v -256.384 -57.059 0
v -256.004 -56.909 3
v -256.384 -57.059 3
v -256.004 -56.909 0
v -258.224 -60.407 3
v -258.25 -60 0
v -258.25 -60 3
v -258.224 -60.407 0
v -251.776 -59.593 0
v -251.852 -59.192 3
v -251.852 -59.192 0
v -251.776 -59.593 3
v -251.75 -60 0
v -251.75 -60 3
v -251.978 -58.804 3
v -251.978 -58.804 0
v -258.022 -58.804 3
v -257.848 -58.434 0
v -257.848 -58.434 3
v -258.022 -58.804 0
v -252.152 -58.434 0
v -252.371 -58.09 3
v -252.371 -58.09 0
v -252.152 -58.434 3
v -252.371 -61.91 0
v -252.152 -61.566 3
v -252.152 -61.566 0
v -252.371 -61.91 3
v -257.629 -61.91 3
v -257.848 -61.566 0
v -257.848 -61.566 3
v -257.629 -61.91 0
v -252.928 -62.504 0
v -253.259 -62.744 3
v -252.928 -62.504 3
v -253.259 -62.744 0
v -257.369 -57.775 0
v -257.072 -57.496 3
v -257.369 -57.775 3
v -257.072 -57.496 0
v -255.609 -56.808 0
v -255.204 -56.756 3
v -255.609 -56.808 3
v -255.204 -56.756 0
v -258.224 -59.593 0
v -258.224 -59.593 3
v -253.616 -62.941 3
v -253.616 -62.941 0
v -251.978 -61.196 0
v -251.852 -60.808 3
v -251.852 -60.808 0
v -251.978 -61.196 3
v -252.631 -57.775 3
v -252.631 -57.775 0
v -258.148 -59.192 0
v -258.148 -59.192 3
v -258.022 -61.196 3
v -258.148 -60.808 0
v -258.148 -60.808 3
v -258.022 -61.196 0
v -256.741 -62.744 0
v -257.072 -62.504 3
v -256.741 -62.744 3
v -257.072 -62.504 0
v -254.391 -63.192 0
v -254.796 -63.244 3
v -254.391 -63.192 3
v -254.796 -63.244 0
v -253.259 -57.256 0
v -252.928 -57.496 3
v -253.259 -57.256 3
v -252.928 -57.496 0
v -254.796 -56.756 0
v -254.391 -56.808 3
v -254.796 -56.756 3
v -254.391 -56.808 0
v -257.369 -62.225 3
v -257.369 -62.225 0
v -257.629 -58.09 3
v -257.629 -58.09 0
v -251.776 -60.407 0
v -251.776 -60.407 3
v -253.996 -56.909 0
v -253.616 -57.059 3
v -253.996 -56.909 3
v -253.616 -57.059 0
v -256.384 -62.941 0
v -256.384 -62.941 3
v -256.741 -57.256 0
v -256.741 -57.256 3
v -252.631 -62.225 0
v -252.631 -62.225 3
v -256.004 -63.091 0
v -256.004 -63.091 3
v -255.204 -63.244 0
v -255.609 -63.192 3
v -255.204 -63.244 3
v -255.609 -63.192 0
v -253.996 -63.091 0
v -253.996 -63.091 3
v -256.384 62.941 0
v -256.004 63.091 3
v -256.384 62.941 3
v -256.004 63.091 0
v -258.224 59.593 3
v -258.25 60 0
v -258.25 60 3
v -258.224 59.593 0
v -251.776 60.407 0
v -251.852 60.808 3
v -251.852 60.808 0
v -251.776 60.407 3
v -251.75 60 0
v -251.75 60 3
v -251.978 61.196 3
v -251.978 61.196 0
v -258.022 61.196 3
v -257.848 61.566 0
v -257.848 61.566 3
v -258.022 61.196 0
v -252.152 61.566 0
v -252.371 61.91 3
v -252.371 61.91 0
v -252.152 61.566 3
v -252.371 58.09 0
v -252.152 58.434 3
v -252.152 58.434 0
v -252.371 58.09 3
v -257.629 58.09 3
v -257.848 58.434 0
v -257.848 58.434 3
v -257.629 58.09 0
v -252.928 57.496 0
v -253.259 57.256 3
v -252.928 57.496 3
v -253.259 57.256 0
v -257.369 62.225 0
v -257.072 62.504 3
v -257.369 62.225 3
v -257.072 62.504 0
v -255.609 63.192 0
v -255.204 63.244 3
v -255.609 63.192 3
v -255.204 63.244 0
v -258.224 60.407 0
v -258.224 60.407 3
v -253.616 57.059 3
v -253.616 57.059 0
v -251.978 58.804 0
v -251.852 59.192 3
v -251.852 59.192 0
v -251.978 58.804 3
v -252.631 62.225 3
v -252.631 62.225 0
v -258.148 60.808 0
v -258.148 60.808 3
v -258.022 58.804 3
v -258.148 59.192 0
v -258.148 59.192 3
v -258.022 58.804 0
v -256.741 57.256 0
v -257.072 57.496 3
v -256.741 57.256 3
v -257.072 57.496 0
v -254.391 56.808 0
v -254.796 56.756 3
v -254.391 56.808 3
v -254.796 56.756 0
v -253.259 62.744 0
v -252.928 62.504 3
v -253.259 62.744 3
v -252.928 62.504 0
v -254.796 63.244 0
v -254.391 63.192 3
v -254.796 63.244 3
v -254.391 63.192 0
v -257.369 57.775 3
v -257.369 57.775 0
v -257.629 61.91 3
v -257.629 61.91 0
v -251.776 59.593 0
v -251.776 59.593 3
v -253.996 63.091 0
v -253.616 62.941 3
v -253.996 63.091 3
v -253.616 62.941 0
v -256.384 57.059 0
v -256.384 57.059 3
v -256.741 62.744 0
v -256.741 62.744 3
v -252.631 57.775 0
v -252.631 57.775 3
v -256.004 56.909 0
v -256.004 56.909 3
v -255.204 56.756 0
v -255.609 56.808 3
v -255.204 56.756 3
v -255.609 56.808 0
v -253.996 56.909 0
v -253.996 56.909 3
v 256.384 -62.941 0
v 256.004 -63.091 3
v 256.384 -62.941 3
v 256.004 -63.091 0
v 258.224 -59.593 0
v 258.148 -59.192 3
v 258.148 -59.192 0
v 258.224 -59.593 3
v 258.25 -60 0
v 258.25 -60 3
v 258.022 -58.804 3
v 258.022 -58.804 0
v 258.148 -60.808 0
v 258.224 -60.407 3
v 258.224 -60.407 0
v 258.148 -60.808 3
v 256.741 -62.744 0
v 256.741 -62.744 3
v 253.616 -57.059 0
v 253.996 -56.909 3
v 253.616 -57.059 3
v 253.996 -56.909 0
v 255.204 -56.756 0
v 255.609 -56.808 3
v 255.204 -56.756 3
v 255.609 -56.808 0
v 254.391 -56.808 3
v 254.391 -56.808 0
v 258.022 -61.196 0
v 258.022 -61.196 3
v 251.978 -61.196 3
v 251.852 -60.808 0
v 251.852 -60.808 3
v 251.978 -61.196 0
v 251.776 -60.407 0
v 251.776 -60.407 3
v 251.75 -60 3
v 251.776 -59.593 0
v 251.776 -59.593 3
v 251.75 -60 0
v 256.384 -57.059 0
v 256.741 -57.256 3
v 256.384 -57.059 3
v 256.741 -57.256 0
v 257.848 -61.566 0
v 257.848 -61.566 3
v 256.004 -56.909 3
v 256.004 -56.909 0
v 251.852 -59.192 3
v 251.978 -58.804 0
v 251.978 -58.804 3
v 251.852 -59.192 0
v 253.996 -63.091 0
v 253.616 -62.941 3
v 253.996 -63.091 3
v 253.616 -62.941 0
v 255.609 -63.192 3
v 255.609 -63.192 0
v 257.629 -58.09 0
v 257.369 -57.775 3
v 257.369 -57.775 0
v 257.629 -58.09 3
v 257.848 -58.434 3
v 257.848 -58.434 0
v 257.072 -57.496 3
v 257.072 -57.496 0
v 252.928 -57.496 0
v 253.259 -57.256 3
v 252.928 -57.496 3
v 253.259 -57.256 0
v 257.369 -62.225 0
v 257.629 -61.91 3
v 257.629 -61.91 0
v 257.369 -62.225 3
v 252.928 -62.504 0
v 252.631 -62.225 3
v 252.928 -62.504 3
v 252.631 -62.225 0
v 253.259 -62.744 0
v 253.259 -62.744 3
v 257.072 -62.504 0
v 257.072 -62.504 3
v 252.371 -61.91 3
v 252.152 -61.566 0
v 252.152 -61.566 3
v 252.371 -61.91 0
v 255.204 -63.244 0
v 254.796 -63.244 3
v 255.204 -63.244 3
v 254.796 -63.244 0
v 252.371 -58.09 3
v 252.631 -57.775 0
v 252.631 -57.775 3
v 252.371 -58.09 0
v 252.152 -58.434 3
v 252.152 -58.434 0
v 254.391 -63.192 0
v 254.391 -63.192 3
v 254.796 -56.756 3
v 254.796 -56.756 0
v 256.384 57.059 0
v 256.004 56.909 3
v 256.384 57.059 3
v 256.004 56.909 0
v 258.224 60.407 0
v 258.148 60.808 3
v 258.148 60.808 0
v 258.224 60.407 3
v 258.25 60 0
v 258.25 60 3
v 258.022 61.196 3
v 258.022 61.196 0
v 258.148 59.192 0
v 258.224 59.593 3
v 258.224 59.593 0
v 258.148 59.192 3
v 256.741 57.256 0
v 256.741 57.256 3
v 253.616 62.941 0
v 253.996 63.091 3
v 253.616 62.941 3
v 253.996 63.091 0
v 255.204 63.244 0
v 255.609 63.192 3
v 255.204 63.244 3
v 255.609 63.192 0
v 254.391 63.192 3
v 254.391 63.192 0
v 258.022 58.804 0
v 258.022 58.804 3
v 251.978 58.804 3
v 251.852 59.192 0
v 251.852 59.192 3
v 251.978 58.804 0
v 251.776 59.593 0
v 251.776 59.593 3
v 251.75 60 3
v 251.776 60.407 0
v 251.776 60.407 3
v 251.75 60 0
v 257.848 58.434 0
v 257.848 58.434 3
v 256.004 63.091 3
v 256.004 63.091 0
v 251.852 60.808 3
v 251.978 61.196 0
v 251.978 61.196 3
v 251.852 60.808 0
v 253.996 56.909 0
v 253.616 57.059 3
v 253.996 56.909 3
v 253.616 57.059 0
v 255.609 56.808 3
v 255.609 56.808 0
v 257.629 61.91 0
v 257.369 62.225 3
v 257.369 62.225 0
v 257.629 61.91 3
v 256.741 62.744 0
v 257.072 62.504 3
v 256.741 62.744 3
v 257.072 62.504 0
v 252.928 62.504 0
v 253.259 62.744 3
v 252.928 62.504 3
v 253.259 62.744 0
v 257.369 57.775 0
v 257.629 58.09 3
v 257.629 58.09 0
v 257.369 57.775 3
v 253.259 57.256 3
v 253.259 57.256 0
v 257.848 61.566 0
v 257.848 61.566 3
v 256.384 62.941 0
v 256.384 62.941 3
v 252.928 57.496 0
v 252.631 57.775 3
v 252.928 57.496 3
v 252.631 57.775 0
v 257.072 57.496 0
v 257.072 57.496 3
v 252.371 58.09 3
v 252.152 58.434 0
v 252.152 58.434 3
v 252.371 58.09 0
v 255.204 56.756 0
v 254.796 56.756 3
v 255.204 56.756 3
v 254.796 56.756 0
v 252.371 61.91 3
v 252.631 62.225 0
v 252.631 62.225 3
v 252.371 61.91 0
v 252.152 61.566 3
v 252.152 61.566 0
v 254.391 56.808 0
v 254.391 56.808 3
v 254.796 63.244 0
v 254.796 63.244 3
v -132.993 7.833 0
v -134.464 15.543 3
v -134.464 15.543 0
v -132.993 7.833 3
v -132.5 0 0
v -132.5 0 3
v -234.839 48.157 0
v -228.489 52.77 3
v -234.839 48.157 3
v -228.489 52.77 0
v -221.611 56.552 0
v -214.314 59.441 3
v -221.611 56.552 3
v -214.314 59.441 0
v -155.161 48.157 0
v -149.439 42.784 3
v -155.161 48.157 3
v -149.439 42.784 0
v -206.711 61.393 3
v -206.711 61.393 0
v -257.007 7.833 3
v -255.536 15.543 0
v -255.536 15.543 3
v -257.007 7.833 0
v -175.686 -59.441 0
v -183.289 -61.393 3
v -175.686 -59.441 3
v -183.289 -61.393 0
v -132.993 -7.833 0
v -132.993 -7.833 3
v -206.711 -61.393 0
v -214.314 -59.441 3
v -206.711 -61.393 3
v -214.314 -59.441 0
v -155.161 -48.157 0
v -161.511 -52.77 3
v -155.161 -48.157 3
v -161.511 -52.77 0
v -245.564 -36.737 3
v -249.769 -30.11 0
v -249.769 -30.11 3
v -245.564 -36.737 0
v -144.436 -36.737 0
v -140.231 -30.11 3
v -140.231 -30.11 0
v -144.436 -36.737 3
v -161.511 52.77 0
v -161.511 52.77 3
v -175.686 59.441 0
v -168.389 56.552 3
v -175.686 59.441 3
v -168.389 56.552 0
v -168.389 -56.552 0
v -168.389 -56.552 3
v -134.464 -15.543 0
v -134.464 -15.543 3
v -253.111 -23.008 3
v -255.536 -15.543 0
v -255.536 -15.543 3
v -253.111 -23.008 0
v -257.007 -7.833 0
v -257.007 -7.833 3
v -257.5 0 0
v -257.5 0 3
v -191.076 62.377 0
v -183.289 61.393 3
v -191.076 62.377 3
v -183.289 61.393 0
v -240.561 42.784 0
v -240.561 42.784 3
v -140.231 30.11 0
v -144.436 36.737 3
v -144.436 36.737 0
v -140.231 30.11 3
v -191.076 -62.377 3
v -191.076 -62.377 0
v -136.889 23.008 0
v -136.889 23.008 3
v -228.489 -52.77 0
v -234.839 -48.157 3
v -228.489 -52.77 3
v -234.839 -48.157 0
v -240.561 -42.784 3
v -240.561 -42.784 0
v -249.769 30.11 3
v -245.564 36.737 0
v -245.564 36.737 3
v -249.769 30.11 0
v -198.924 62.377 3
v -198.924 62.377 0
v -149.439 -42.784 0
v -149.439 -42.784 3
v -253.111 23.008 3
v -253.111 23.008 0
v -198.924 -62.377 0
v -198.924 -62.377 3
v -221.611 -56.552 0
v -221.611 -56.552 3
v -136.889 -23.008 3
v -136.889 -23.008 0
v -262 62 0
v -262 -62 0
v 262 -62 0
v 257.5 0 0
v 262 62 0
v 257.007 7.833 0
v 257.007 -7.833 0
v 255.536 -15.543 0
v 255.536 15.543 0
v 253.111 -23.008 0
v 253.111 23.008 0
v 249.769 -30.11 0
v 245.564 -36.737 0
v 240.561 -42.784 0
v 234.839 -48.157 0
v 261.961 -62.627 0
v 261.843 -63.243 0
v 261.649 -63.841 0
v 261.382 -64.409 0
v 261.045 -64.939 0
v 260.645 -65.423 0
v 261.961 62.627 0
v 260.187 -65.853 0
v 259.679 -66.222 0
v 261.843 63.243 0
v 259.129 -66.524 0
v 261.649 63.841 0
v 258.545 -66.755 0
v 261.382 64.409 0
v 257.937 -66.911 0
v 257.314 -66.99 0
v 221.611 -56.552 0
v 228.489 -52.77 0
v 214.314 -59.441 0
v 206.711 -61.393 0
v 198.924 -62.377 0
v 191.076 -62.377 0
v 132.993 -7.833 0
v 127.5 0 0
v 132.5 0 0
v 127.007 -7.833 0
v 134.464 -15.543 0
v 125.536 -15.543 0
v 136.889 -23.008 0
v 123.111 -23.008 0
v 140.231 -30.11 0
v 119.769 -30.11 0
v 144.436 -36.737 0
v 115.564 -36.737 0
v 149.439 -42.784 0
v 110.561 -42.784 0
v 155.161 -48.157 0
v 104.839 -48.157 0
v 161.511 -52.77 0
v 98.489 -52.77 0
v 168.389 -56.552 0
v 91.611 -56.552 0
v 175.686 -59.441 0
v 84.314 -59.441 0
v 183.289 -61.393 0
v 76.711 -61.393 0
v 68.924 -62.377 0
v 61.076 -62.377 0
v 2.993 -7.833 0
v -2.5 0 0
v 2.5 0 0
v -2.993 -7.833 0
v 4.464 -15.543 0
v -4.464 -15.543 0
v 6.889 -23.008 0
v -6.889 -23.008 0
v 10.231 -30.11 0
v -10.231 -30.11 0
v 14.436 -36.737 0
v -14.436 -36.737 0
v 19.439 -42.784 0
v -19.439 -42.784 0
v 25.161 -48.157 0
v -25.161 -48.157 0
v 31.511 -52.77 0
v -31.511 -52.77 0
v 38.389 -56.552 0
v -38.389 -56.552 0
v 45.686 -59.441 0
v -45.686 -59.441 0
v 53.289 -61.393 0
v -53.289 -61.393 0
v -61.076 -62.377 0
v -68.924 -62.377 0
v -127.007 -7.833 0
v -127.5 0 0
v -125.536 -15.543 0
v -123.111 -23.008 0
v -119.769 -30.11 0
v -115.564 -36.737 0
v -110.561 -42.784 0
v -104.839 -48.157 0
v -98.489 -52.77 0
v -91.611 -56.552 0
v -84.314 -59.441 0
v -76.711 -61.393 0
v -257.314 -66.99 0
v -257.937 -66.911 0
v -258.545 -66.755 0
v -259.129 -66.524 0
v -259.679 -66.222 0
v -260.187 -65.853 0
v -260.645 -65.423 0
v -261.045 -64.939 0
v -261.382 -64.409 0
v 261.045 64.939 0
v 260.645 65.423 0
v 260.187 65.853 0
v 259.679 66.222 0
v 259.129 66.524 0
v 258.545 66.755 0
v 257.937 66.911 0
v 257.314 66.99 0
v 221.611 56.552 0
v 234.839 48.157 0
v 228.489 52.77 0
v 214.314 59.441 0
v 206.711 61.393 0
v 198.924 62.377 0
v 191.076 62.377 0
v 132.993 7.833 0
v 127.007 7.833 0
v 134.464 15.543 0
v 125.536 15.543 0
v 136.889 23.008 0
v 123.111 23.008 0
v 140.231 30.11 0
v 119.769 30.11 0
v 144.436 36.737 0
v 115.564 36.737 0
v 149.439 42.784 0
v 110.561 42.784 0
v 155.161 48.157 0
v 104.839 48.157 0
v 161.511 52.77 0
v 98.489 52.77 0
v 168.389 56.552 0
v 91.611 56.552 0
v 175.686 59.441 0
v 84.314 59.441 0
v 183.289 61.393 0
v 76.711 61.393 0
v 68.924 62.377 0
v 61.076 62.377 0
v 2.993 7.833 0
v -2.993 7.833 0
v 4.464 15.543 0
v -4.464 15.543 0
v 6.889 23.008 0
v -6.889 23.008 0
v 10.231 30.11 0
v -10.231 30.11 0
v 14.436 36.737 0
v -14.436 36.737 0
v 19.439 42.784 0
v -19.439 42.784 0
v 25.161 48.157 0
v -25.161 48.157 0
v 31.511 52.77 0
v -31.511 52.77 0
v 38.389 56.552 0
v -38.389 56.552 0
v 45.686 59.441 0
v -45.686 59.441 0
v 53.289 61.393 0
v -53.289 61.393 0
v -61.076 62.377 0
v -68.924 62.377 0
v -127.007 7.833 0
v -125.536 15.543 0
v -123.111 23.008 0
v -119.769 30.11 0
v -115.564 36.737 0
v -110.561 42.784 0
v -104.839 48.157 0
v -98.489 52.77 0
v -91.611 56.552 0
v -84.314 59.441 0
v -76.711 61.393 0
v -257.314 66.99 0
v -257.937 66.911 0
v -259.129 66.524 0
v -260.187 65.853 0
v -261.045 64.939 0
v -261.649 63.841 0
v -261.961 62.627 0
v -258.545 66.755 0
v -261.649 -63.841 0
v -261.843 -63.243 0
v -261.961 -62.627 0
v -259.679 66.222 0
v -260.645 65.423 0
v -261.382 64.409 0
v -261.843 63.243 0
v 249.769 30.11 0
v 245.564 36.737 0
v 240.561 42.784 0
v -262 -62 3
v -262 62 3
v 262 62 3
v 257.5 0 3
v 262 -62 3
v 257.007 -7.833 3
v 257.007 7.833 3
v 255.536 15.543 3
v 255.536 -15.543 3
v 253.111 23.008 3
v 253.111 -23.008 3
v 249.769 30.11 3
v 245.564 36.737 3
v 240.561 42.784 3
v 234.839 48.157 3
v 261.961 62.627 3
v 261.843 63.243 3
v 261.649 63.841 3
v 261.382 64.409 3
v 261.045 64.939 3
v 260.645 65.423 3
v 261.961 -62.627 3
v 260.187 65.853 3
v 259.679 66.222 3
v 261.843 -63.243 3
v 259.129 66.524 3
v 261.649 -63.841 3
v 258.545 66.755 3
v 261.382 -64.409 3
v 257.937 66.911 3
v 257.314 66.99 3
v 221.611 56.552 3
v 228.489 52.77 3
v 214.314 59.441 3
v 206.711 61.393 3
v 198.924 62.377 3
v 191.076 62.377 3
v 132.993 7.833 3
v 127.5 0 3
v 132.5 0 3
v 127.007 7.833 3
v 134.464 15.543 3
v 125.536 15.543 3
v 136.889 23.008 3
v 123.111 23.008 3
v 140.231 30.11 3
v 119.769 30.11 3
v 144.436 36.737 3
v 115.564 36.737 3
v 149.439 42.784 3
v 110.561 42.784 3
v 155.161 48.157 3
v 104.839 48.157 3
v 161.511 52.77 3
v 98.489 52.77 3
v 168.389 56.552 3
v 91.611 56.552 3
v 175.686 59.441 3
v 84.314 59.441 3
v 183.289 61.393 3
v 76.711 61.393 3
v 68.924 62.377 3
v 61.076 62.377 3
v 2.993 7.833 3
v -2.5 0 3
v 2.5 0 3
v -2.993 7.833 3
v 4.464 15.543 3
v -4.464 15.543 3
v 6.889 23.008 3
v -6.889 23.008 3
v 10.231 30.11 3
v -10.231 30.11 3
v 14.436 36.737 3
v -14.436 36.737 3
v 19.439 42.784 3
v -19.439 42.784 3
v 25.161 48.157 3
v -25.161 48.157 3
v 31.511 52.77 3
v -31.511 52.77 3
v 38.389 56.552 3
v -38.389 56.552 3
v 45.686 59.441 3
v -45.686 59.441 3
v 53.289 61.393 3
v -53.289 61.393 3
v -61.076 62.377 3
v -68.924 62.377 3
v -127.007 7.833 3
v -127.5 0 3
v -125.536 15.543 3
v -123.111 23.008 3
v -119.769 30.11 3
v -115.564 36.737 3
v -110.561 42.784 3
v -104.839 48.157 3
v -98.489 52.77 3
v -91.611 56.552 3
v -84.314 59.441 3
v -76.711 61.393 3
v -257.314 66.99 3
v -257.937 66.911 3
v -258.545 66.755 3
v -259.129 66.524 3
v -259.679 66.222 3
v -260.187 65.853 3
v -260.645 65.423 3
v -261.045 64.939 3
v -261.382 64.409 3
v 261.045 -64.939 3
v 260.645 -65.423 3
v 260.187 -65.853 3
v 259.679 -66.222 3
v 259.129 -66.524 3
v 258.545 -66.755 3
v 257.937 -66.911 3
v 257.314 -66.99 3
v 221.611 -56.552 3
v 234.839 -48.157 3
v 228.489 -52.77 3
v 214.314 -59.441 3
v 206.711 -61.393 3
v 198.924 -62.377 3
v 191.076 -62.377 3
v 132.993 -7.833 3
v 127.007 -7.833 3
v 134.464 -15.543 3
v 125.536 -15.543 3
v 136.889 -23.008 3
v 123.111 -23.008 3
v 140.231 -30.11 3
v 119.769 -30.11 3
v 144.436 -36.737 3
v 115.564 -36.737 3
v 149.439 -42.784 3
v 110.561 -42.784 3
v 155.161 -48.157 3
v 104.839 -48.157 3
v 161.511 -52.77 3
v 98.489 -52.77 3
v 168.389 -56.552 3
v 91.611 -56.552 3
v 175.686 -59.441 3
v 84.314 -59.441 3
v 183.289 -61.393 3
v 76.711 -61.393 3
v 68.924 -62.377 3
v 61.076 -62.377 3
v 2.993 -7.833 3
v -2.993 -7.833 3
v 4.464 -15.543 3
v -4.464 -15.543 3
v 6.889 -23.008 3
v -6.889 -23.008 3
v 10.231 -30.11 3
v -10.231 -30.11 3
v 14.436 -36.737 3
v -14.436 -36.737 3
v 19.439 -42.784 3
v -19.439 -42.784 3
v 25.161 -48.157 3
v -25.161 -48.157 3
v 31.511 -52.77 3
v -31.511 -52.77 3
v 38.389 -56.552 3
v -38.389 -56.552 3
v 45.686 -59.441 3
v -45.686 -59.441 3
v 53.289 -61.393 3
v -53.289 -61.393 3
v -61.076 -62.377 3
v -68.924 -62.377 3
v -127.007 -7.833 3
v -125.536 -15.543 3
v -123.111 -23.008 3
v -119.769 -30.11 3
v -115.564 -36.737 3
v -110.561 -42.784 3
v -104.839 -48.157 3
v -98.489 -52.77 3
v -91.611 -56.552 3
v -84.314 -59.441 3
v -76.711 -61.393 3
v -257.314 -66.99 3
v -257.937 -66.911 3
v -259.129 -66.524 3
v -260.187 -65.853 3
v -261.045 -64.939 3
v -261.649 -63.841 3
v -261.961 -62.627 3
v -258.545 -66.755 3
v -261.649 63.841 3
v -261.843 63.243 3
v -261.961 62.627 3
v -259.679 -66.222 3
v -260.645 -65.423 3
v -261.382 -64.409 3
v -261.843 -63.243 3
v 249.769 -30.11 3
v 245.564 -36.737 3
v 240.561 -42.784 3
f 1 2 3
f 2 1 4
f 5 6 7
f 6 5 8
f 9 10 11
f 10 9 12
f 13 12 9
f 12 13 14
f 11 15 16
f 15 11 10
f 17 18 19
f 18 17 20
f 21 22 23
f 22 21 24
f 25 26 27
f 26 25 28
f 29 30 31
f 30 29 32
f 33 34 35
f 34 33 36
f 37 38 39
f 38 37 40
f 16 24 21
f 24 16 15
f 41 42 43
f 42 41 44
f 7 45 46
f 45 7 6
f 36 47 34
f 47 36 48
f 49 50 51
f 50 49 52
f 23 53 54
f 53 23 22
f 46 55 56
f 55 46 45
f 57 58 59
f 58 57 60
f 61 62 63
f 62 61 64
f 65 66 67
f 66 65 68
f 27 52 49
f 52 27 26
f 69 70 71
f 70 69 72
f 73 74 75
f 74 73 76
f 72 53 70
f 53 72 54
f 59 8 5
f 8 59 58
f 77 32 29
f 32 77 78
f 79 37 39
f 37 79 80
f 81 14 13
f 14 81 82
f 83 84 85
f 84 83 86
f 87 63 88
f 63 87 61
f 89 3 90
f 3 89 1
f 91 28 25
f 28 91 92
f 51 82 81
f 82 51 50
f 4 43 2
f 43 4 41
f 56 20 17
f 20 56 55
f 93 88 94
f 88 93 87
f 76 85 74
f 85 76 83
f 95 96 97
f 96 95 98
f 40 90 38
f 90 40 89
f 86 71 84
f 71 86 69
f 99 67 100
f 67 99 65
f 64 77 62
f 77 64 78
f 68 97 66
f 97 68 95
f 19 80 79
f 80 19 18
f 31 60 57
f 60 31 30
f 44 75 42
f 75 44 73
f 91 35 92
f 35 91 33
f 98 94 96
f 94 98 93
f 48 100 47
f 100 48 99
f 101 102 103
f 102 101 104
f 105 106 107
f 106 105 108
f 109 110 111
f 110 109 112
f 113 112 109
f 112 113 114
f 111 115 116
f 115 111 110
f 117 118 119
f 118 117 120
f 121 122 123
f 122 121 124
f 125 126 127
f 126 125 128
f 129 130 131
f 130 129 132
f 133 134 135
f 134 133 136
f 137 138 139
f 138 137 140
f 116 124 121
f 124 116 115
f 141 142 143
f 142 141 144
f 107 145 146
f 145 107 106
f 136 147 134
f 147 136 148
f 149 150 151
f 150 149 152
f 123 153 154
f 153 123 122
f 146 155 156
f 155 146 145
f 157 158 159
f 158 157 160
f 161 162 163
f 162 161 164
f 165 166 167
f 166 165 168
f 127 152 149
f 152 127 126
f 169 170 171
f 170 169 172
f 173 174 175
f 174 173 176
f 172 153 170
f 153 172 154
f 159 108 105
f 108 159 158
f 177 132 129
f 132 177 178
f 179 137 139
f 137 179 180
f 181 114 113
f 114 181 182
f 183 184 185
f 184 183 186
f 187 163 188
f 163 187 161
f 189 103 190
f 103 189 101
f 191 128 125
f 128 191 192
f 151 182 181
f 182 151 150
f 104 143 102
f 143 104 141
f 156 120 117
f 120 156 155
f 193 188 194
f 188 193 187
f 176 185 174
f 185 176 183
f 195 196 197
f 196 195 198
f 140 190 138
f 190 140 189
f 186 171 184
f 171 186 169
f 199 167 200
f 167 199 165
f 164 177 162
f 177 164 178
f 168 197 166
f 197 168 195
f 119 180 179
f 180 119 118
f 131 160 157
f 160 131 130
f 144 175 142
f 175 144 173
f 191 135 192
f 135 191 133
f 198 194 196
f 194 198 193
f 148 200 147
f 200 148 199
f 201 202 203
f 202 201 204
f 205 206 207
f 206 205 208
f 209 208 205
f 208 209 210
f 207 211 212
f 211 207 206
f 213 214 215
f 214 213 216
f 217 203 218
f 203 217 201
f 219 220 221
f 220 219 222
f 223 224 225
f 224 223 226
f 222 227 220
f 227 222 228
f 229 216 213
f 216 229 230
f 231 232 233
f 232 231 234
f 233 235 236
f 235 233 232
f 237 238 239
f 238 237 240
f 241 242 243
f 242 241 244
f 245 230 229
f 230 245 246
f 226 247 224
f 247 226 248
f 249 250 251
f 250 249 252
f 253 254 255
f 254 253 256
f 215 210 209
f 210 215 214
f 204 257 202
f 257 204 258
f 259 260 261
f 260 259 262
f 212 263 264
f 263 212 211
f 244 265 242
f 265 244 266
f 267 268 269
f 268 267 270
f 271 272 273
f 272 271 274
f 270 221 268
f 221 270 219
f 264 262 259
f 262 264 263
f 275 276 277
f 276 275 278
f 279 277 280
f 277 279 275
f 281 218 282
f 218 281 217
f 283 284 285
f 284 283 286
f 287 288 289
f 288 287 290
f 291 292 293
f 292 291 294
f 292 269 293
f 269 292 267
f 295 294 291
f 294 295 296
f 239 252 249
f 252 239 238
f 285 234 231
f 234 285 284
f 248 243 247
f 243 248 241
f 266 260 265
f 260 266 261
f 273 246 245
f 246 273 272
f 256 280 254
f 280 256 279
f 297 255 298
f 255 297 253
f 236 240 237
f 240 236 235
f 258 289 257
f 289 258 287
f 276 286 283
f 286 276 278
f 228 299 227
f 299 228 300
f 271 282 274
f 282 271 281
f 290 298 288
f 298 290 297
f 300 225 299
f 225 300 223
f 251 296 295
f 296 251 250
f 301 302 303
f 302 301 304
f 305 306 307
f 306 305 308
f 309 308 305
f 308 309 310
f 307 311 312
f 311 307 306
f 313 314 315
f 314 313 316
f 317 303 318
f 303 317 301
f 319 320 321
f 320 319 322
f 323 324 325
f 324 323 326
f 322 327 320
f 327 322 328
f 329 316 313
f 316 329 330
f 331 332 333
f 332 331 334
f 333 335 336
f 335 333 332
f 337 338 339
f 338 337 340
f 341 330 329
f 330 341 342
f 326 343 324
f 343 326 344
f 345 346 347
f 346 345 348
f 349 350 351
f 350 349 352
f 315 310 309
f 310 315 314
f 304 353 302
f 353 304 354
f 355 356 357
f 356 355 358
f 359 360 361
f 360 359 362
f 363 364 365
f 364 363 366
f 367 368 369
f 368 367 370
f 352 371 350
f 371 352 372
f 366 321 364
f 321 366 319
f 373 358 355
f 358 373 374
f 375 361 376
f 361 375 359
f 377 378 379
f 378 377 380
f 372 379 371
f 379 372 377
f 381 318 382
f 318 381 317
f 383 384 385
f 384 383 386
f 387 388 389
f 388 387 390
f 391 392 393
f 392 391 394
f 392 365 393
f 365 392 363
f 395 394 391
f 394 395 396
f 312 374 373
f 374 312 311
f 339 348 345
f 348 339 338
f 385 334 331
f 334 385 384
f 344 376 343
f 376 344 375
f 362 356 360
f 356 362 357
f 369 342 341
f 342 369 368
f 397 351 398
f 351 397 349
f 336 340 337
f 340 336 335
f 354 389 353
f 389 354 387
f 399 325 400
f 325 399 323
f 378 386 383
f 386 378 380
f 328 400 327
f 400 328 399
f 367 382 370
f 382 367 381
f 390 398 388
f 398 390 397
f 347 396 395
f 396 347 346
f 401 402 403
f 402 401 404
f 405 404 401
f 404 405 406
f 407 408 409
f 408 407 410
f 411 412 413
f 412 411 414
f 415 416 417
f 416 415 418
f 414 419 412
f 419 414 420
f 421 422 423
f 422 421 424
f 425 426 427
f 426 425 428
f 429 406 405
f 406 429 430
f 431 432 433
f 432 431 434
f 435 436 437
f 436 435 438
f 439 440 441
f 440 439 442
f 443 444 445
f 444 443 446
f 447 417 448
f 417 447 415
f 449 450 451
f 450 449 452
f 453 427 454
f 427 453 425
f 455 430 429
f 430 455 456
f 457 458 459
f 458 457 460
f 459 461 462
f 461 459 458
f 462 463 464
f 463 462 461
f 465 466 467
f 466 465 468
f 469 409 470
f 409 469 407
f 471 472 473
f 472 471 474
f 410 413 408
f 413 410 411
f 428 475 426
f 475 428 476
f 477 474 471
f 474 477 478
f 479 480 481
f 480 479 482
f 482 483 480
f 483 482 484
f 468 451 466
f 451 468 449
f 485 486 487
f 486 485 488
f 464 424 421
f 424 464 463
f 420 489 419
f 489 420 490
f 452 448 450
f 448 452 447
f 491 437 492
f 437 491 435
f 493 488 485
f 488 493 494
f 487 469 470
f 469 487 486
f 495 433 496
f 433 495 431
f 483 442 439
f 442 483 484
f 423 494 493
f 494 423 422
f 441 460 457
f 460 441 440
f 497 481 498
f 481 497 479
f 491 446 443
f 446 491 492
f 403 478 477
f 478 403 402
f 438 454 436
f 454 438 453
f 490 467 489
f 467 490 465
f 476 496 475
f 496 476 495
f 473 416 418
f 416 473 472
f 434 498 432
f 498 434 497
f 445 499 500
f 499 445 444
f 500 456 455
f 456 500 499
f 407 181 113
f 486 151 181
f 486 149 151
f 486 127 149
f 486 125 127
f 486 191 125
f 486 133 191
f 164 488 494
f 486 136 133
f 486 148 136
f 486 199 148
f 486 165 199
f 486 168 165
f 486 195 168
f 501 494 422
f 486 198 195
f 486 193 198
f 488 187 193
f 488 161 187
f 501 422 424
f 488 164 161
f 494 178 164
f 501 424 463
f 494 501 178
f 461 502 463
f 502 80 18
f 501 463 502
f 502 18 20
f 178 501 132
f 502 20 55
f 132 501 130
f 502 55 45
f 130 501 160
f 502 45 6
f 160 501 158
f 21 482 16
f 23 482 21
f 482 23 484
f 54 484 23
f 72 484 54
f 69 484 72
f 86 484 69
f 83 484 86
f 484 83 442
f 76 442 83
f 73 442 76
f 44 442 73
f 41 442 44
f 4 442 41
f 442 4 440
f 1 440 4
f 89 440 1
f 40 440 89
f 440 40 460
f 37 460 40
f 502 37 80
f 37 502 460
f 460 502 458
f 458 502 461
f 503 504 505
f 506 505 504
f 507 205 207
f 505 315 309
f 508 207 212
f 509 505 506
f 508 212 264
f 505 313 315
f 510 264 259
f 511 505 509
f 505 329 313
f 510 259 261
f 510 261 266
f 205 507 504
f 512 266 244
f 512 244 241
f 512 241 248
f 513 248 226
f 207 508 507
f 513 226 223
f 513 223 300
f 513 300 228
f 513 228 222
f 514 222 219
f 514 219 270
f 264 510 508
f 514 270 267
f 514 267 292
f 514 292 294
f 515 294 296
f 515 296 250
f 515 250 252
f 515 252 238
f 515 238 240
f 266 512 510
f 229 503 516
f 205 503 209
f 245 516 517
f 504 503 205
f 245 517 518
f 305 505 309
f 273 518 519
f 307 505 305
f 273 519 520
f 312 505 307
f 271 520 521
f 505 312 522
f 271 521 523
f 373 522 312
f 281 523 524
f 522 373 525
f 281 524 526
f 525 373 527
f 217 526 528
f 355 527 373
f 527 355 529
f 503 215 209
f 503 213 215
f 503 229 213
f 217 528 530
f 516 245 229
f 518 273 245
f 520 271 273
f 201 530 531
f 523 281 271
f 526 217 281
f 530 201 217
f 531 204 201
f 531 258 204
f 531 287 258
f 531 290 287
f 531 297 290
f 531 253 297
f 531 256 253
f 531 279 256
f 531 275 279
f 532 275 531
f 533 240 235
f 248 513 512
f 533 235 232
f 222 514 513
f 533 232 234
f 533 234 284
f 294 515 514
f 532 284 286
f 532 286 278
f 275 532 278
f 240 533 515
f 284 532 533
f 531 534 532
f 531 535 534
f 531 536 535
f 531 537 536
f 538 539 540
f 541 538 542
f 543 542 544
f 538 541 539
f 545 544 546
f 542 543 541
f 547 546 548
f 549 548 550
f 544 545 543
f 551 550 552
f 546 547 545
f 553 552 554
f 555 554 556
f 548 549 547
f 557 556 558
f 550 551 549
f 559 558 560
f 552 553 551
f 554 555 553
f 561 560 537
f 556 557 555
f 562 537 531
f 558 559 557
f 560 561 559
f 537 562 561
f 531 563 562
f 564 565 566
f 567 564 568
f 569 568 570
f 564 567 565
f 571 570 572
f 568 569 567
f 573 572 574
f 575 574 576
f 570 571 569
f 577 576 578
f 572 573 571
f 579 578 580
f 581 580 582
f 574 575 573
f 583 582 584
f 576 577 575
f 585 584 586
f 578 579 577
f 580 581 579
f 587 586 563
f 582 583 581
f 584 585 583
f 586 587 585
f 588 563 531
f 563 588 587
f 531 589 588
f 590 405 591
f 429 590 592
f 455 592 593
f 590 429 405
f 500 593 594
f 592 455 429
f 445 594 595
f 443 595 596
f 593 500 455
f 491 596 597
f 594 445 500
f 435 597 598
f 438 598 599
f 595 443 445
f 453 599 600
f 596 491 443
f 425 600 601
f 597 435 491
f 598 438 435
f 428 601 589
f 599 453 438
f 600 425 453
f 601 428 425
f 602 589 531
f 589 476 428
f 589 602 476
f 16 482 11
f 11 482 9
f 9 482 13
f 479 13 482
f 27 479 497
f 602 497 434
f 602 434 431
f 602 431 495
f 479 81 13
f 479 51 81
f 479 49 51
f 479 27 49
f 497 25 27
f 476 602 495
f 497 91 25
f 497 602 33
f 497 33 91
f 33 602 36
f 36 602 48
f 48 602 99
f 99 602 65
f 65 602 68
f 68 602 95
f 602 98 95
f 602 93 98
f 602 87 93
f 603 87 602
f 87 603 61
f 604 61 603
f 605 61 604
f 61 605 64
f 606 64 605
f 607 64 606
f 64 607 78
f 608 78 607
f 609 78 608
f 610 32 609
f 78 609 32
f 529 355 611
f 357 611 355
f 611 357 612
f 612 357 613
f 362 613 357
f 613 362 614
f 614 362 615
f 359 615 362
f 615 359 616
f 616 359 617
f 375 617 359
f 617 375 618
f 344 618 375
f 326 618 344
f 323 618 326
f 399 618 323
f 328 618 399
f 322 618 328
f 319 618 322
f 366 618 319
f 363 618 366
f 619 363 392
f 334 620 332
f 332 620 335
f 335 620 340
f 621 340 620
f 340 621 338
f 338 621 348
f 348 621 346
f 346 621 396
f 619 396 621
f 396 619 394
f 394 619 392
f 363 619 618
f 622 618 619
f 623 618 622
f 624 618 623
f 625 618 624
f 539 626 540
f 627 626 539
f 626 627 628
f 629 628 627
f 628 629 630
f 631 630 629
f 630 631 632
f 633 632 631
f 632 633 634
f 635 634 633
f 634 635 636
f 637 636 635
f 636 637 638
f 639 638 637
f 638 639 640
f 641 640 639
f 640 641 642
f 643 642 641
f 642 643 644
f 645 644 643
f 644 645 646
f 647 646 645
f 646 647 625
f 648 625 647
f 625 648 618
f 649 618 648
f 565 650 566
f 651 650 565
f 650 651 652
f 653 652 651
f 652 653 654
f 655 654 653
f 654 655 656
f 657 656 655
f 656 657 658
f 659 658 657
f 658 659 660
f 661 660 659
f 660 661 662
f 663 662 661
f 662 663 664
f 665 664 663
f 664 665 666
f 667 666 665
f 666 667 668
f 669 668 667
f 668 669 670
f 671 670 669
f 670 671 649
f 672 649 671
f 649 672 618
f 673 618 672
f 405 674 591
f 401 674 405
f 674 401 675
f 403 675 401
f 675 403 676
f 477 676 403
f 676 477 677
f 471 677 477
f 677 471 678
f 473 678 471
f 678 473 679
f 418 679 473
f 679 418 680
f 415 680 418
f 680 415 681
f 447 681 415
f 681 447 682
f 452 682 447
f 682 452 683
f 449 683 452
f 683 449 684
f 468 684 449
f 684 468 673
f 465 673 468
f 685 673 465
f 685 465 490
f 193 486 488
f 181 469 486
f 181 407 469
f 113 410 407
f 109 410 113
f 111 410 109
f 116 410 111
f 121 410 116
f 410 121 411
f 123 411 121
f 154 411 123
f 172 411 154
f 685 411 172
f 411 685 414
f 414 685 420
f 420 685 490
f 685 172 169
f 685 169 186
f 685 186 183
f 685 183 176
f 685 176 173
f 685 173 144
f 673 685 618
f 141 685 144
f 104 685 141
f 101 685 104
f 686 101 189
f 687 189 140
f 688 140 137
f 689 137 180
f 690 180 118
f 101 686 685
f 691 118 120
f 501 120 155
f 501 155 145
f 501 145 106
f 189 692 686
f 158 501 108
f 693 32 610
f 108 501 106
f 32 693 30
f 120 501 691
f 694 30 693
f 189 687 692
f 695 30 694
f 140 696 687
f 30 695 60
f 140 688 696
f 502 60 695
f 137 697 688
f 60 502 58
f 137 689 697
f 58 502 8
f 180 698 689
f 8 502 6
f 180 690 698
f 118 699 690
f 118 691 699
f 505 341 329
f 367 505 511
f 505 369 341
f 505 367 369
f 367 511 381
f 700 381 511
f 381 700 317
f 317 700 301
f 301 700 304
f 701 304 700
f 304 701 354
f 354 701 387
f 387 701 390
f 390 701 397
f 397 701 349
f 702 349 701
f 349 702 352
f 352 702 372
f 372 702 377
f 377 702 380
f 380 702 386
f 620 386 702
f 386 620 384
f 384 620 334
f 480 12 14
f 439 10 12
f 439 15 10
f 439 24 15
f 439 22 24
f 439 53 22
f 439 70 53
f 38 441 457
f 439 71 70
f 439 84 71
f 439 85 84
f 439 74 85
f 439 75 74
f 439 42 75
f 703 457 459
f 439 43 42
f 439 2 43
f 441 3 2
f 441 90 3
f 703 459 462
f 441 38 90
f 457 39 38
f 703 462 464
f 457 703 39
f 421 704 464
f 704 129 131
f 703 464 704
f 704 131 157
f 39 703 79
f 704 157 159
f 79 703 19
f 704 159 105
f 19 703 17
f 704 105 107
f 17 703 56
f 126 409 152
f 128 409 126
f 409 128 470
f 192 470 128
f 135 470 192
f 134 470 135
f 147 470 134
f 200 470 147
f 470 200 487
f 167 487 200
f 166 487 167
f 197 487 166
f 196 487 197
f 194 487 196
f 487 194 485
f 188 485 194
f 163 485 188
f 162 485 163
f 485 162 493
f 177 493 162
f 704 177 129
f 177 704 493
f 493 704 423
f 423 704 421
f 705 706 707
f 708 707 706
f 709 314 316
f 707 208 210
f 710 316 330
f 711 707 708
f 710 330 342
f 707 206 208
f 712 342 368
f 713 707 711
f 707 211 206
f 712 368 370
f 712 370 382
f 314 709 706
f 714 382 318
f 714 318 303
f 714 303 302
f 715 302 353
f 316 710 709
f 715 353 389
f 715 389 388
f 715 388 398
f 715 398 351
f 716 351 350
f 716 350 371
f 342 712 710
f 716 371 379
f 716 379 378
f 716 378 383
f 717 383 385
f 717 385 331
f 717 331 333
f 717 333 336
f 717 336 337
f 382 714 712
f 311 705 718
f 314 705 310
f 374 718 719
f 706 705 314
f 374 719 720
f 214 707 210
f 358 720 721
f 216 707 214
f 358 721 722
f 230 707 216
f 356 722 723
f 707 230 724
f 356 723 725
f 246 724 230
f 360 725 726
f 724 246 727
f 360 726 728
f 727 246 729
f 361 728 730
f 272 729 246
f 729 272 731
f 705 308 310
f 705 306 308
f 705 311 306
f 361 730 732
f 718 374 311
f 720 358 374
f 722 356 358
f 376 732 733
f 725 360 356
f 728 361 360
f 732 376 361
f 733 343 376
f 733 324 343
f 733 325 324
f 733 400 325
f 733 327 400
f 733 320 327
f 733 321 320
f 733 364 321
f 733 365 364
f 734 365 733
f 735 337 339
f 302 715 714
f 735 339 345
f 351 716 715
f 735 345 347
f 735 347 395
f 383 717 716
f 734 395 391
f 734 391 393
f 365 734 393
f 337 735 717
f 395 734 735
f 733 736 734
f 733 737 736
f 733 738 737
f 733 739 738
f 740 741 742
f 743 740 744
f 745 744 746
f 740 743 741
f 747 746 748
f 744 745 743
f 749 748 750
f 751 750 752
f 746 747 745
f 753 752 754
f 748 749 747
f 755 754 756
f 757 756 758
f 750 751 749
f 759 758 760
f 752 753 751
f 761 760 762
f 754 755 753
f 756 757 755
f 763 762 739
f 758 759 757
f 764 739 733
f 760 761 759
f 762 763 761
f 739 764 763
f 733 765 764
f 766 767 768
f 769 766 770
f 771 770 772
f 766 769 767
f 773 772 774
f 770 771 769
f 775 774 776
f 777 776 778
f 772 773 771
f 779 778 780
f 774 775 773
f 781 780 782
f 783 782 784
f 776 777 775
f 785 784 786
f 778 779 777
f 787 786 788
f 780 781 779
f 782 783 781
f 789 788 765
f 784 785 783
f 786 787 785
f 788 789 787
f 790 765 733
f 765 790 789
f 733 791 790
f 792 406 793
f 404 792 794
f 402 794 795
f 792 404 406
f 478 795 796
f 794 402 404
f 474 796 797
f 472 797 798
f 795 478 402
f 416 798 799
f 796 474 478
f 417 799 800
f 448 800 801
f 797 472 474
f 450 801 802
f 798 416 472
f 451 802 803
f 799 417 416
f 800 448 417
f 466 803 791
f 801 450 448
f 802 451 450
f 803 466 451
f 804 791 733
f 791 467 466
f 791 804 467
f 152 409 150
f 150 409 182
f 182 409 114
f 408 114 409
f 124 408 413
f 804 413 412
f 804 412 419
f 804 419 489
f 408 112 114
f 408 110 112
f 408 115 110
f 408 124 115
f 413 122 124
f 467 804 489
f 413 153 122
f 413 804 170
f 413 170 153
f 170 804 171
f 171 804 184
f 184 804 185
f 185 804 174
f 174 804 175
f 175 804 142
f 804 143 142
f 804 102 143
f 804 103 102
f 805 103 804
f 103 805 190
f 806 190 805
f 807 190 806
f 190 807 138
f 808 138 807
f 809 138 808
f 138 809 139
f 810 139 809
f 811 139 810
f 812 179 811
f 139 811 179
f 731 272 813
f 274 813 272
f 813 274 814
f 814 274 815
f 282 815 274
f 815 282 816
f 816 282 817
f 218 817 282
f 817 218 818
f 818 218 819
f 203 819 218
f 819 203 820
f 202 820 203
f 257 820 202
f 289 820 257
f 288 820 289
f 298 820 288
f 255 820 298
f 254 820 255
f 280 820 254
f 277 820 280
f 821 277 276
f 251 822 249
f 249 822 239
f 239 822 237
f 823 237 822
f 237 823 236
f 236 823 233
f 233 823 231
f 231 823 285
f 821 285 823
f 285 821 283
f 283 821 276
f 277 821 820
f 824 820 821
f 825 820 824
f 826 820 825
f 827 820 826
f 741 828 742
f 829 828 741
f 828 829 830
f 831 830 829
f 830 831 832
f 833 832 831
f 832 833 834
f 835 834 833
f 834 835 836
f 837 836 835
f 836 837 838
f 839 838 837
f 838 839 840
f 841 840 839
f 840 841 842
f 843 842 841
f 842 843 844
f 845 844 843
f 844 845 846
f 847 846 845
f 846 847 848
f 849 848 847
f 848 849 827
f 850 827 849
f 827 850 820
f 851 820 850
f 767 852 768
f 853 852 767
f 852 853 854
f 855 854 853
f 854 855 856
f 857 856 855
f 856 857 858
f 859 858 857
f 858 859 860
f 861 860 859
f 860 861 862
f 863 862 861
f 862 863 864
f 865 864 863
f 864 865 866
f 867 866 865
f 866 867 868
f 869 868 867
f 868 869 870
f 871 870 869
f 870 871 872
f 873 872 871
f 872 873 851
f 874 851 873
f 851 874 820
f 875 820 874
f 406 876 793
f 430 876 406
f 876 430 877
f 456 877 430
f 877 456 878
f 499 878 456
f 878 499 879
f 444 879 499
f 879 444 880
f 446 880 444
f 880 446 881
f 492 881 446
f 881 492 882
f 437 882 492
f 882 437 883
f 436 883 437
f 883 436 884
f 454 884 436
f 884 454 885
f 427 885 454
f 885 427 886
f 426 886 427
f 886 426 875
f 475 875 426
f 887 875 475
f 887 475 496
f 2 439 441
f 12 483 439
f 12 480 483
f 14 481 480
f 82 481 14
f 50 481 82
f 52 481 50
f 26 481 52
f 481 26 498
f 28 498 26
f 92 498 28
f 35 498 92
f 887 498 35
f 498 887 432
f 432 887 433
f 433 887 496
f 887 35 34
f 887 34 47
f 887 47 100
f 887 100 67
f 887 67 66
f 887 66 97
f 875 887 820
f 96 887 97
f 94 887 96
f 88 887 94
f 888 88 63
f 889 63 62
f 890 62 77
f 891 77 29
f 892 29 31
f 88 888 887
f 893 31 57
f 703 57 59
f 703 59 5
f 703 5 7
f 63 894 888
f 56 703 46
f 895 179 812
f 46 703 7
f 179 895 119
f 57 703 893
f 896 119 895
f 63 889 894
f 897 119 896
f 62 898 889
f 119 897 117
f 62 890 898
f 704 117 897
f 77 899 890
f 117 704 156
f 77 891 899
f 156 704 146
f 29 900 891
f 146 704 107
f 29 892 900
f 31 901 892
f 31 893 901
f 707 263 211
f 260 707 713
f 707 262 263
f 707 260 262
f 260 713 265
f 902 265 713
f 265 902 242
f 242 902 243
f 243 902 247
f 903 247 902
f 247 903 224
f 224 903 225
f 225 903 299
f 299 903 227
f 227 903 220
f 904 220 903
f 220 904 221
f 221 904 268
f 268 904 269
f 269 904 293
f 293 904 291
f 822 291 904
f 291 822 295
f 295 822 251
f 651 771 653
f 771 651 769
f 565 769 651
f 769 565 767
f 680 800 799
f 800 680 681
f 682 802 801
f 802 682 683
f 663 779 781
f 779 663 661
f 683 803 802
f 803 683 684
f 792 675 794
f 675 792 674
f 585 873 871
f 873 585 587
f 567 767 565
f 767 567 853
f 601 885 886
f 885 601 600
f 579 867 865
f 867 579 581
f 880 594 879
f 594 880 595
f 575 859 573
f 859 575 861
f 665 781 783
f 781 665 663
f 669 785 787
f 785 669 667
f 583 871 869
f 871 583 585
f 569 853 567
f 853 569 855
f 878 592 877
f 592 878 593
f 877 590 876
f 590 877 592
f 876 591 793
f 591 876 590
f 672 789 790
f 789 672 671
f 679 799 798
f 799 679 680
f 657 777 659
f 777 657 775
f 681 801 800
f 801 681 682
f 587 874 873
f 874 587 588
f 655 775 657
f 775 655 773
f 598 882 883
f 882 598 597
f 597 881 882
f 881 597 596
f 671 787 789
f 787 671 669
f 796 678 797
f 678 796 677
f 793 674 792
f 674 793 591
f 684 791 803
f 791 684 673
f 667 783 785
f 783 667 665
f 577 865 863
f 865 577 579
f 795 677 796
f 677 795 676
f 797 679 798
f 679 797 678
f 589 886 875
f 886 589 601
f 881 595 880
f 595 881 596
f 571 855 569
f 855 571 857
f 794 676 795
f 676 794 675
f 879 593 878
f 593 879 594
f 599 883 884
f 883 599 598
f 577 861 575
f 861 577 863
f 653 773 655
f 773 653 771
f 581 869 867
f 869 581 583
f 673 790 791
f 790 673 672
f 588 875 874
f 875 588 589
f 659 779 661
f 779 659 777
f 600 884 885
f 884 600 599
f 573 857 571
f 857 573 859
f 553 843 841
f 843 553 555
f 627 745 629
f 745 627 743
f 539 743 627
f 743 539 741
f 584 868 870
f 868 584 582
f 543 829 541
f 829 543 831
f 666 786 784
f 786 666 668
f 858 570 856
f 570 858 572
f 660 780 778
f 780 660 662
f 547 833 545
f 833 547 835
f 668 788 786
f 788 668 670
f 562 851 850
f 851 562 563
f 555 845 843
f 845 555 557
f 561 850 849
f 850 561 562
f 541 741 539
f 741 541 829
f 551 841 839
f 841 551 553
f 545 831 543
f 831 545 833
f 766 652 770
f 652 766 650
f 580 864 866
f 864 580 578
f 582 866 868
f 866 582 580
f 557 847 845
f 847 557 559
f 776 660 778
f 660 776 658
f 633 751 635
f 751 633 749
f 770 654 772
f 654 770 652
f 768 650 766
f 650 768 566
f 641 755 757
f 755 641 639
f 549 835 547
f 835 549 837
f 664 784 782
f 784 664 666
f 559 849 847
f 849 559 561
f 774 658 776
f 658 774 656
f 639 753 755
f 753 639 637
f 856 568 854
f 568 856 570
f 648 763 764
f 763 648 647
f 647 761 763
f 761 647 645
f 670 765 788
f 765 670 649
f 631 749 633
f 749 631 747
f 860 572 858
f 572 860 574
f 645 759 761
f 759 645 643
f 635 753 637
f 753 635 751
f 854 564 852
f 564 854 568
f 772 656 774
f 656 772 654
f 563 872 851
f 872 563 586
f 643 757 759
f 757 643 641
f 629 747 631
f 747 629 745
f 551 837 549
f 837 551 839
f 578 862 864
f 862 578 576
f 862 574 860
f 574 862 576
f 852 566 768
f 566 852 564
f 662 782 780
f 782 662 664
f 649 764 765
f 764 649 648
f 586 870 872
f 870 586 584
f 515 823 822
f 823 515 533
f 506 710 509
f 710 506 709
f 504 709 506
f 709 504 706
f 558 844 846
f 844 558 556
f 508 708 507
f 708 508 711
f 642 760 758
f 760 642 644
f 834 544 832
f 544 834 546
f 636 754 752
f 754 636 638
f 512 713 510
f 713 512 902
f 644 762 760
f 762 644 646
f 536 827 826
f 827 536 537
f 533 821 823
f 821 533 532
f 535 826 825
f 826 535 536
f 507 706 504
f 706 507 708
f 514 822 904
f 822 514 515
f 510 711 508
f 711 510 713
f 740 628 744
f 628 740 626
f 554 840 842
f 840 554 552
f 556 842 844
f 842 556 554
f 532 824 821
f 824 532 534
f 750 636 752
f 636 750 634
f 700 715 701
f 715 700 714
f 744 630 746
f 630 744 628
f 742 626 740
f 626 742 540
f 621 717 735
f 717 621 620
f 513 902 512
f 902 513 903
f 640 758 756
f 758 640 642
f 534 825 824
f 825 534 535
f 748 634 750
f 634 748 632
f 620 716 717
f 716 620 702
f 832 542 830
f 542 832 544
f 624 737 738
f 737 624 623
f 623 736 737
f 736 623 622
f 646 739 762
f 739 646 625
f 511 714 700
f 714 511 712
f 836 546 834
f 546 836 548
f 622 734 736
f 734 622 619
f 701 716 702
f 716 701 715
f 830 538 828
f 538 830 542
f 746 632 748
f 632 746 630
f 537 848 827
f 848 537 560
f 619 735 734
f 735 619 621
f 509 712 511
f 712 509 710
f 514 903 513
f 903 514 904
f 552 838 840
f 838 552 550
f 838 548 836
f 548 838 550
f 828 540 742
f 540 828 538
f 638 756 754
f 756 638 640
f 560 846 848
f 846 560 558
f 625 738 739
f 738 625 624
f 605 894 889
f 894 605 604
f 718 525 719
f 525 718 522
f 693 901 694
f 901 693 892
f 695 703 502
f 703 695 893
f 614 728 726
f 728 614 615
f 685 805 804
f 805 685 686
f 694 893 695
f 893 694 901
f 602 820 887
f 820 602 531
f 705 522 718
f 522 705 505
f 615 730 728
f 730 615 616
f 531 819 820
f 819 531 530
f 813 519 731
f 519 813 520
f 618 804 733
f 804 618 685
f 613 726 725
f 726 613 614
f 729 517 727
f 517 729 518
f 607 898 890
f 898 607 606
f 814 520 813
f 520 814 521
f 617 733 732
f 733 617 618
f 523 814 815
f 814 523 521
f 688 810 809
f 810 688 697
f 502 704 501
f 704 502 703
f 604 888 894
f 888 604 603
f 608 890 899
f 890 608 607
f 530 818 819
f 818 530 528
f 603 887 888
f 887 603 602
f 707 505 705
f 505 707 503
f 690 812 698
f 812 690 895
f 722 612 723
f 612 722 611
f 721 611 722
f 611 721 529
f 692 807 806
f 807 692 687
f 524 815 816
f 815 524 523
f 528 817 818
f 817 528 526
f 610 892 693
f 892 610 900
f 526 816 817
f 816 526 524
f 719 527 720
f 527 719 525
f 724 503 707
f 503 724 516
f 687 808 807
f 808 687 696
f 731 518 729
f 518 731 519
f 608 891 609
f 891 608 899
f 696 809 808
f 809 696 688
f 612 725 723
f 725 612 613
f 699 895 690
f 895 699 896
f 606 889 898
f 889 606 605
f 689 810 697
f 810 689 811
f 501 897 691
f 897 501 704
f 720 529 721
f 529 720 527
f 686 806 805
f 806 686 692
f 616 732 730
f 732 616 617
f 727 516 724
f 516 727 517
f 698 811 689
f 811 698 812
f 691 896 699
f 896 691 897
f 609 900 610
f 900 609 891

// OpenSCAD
$fn = 50;

difference() {
	union() {
		hull() {
			translate(v = [-257.0, 62.0, 0]) {
				cylinder(h = 3, r = 5);
			}
			translate(v = [257.0, 62.0, 0]) {
				cylinder(h = 3, r = 5);
			}
			translate(v = [-257.0, -62.0, 0]) {
				cylinder(h = 3, r = 5);
			}
			translate(v = [257.0, -62.0, 0]) {
				cylinder(h = 3, r = 5);
			}
		}
	}
	union() {
		translate(v = [-255.0, -60.0, -100.0]) {
			cylinder(h = 200, r = 3.25);
		}
		translate(v = [-255.0, 60.0, -100.0]) {
			cylinder(h = 200, r = 3.25);
		}
		translate(v = [255.0, -60.0, -100.0]) {
			cylinder(h = 200, r = 3.25);
		}
		translate(v = [255.0, 60.0, -100.0]) {
			cylinder(h = 200, r = 3.25);
		}
		translate(v = [-255.0, -60.0, -100.0]) {
			cylinder(h = 200, r = 1.8);
		}
		translate(v = [-255.0, 60.0, -100.0]) {
			cylinder(h = 200, r = 1.8);
		}
		translate(v = [255.0, -60.0, -100.0]) {
			cylinder(h = 200, r = 1.8);
		}
		translate(v = [255.0, 60.0, -100.0]) {
			cylinder(h = 200, r = 1.8);
		}
		translate(v = [-195.0, 0, 0.0]) {
			cylinder(h = 3, r = 62.5);
		}
		translate(v = [-65.0, 0, 0.0]) {
			cylinder(h = 3, r = 62.5);
		}
		translate(v = [65.0, 0, 0.0]) {
			cylinder(h = 3, r = 62.5);
		}
		translate(v = [195.0, 0, 0.0]) {
			cylinder(h = 3, r = 62.5);
		}
	}
}
